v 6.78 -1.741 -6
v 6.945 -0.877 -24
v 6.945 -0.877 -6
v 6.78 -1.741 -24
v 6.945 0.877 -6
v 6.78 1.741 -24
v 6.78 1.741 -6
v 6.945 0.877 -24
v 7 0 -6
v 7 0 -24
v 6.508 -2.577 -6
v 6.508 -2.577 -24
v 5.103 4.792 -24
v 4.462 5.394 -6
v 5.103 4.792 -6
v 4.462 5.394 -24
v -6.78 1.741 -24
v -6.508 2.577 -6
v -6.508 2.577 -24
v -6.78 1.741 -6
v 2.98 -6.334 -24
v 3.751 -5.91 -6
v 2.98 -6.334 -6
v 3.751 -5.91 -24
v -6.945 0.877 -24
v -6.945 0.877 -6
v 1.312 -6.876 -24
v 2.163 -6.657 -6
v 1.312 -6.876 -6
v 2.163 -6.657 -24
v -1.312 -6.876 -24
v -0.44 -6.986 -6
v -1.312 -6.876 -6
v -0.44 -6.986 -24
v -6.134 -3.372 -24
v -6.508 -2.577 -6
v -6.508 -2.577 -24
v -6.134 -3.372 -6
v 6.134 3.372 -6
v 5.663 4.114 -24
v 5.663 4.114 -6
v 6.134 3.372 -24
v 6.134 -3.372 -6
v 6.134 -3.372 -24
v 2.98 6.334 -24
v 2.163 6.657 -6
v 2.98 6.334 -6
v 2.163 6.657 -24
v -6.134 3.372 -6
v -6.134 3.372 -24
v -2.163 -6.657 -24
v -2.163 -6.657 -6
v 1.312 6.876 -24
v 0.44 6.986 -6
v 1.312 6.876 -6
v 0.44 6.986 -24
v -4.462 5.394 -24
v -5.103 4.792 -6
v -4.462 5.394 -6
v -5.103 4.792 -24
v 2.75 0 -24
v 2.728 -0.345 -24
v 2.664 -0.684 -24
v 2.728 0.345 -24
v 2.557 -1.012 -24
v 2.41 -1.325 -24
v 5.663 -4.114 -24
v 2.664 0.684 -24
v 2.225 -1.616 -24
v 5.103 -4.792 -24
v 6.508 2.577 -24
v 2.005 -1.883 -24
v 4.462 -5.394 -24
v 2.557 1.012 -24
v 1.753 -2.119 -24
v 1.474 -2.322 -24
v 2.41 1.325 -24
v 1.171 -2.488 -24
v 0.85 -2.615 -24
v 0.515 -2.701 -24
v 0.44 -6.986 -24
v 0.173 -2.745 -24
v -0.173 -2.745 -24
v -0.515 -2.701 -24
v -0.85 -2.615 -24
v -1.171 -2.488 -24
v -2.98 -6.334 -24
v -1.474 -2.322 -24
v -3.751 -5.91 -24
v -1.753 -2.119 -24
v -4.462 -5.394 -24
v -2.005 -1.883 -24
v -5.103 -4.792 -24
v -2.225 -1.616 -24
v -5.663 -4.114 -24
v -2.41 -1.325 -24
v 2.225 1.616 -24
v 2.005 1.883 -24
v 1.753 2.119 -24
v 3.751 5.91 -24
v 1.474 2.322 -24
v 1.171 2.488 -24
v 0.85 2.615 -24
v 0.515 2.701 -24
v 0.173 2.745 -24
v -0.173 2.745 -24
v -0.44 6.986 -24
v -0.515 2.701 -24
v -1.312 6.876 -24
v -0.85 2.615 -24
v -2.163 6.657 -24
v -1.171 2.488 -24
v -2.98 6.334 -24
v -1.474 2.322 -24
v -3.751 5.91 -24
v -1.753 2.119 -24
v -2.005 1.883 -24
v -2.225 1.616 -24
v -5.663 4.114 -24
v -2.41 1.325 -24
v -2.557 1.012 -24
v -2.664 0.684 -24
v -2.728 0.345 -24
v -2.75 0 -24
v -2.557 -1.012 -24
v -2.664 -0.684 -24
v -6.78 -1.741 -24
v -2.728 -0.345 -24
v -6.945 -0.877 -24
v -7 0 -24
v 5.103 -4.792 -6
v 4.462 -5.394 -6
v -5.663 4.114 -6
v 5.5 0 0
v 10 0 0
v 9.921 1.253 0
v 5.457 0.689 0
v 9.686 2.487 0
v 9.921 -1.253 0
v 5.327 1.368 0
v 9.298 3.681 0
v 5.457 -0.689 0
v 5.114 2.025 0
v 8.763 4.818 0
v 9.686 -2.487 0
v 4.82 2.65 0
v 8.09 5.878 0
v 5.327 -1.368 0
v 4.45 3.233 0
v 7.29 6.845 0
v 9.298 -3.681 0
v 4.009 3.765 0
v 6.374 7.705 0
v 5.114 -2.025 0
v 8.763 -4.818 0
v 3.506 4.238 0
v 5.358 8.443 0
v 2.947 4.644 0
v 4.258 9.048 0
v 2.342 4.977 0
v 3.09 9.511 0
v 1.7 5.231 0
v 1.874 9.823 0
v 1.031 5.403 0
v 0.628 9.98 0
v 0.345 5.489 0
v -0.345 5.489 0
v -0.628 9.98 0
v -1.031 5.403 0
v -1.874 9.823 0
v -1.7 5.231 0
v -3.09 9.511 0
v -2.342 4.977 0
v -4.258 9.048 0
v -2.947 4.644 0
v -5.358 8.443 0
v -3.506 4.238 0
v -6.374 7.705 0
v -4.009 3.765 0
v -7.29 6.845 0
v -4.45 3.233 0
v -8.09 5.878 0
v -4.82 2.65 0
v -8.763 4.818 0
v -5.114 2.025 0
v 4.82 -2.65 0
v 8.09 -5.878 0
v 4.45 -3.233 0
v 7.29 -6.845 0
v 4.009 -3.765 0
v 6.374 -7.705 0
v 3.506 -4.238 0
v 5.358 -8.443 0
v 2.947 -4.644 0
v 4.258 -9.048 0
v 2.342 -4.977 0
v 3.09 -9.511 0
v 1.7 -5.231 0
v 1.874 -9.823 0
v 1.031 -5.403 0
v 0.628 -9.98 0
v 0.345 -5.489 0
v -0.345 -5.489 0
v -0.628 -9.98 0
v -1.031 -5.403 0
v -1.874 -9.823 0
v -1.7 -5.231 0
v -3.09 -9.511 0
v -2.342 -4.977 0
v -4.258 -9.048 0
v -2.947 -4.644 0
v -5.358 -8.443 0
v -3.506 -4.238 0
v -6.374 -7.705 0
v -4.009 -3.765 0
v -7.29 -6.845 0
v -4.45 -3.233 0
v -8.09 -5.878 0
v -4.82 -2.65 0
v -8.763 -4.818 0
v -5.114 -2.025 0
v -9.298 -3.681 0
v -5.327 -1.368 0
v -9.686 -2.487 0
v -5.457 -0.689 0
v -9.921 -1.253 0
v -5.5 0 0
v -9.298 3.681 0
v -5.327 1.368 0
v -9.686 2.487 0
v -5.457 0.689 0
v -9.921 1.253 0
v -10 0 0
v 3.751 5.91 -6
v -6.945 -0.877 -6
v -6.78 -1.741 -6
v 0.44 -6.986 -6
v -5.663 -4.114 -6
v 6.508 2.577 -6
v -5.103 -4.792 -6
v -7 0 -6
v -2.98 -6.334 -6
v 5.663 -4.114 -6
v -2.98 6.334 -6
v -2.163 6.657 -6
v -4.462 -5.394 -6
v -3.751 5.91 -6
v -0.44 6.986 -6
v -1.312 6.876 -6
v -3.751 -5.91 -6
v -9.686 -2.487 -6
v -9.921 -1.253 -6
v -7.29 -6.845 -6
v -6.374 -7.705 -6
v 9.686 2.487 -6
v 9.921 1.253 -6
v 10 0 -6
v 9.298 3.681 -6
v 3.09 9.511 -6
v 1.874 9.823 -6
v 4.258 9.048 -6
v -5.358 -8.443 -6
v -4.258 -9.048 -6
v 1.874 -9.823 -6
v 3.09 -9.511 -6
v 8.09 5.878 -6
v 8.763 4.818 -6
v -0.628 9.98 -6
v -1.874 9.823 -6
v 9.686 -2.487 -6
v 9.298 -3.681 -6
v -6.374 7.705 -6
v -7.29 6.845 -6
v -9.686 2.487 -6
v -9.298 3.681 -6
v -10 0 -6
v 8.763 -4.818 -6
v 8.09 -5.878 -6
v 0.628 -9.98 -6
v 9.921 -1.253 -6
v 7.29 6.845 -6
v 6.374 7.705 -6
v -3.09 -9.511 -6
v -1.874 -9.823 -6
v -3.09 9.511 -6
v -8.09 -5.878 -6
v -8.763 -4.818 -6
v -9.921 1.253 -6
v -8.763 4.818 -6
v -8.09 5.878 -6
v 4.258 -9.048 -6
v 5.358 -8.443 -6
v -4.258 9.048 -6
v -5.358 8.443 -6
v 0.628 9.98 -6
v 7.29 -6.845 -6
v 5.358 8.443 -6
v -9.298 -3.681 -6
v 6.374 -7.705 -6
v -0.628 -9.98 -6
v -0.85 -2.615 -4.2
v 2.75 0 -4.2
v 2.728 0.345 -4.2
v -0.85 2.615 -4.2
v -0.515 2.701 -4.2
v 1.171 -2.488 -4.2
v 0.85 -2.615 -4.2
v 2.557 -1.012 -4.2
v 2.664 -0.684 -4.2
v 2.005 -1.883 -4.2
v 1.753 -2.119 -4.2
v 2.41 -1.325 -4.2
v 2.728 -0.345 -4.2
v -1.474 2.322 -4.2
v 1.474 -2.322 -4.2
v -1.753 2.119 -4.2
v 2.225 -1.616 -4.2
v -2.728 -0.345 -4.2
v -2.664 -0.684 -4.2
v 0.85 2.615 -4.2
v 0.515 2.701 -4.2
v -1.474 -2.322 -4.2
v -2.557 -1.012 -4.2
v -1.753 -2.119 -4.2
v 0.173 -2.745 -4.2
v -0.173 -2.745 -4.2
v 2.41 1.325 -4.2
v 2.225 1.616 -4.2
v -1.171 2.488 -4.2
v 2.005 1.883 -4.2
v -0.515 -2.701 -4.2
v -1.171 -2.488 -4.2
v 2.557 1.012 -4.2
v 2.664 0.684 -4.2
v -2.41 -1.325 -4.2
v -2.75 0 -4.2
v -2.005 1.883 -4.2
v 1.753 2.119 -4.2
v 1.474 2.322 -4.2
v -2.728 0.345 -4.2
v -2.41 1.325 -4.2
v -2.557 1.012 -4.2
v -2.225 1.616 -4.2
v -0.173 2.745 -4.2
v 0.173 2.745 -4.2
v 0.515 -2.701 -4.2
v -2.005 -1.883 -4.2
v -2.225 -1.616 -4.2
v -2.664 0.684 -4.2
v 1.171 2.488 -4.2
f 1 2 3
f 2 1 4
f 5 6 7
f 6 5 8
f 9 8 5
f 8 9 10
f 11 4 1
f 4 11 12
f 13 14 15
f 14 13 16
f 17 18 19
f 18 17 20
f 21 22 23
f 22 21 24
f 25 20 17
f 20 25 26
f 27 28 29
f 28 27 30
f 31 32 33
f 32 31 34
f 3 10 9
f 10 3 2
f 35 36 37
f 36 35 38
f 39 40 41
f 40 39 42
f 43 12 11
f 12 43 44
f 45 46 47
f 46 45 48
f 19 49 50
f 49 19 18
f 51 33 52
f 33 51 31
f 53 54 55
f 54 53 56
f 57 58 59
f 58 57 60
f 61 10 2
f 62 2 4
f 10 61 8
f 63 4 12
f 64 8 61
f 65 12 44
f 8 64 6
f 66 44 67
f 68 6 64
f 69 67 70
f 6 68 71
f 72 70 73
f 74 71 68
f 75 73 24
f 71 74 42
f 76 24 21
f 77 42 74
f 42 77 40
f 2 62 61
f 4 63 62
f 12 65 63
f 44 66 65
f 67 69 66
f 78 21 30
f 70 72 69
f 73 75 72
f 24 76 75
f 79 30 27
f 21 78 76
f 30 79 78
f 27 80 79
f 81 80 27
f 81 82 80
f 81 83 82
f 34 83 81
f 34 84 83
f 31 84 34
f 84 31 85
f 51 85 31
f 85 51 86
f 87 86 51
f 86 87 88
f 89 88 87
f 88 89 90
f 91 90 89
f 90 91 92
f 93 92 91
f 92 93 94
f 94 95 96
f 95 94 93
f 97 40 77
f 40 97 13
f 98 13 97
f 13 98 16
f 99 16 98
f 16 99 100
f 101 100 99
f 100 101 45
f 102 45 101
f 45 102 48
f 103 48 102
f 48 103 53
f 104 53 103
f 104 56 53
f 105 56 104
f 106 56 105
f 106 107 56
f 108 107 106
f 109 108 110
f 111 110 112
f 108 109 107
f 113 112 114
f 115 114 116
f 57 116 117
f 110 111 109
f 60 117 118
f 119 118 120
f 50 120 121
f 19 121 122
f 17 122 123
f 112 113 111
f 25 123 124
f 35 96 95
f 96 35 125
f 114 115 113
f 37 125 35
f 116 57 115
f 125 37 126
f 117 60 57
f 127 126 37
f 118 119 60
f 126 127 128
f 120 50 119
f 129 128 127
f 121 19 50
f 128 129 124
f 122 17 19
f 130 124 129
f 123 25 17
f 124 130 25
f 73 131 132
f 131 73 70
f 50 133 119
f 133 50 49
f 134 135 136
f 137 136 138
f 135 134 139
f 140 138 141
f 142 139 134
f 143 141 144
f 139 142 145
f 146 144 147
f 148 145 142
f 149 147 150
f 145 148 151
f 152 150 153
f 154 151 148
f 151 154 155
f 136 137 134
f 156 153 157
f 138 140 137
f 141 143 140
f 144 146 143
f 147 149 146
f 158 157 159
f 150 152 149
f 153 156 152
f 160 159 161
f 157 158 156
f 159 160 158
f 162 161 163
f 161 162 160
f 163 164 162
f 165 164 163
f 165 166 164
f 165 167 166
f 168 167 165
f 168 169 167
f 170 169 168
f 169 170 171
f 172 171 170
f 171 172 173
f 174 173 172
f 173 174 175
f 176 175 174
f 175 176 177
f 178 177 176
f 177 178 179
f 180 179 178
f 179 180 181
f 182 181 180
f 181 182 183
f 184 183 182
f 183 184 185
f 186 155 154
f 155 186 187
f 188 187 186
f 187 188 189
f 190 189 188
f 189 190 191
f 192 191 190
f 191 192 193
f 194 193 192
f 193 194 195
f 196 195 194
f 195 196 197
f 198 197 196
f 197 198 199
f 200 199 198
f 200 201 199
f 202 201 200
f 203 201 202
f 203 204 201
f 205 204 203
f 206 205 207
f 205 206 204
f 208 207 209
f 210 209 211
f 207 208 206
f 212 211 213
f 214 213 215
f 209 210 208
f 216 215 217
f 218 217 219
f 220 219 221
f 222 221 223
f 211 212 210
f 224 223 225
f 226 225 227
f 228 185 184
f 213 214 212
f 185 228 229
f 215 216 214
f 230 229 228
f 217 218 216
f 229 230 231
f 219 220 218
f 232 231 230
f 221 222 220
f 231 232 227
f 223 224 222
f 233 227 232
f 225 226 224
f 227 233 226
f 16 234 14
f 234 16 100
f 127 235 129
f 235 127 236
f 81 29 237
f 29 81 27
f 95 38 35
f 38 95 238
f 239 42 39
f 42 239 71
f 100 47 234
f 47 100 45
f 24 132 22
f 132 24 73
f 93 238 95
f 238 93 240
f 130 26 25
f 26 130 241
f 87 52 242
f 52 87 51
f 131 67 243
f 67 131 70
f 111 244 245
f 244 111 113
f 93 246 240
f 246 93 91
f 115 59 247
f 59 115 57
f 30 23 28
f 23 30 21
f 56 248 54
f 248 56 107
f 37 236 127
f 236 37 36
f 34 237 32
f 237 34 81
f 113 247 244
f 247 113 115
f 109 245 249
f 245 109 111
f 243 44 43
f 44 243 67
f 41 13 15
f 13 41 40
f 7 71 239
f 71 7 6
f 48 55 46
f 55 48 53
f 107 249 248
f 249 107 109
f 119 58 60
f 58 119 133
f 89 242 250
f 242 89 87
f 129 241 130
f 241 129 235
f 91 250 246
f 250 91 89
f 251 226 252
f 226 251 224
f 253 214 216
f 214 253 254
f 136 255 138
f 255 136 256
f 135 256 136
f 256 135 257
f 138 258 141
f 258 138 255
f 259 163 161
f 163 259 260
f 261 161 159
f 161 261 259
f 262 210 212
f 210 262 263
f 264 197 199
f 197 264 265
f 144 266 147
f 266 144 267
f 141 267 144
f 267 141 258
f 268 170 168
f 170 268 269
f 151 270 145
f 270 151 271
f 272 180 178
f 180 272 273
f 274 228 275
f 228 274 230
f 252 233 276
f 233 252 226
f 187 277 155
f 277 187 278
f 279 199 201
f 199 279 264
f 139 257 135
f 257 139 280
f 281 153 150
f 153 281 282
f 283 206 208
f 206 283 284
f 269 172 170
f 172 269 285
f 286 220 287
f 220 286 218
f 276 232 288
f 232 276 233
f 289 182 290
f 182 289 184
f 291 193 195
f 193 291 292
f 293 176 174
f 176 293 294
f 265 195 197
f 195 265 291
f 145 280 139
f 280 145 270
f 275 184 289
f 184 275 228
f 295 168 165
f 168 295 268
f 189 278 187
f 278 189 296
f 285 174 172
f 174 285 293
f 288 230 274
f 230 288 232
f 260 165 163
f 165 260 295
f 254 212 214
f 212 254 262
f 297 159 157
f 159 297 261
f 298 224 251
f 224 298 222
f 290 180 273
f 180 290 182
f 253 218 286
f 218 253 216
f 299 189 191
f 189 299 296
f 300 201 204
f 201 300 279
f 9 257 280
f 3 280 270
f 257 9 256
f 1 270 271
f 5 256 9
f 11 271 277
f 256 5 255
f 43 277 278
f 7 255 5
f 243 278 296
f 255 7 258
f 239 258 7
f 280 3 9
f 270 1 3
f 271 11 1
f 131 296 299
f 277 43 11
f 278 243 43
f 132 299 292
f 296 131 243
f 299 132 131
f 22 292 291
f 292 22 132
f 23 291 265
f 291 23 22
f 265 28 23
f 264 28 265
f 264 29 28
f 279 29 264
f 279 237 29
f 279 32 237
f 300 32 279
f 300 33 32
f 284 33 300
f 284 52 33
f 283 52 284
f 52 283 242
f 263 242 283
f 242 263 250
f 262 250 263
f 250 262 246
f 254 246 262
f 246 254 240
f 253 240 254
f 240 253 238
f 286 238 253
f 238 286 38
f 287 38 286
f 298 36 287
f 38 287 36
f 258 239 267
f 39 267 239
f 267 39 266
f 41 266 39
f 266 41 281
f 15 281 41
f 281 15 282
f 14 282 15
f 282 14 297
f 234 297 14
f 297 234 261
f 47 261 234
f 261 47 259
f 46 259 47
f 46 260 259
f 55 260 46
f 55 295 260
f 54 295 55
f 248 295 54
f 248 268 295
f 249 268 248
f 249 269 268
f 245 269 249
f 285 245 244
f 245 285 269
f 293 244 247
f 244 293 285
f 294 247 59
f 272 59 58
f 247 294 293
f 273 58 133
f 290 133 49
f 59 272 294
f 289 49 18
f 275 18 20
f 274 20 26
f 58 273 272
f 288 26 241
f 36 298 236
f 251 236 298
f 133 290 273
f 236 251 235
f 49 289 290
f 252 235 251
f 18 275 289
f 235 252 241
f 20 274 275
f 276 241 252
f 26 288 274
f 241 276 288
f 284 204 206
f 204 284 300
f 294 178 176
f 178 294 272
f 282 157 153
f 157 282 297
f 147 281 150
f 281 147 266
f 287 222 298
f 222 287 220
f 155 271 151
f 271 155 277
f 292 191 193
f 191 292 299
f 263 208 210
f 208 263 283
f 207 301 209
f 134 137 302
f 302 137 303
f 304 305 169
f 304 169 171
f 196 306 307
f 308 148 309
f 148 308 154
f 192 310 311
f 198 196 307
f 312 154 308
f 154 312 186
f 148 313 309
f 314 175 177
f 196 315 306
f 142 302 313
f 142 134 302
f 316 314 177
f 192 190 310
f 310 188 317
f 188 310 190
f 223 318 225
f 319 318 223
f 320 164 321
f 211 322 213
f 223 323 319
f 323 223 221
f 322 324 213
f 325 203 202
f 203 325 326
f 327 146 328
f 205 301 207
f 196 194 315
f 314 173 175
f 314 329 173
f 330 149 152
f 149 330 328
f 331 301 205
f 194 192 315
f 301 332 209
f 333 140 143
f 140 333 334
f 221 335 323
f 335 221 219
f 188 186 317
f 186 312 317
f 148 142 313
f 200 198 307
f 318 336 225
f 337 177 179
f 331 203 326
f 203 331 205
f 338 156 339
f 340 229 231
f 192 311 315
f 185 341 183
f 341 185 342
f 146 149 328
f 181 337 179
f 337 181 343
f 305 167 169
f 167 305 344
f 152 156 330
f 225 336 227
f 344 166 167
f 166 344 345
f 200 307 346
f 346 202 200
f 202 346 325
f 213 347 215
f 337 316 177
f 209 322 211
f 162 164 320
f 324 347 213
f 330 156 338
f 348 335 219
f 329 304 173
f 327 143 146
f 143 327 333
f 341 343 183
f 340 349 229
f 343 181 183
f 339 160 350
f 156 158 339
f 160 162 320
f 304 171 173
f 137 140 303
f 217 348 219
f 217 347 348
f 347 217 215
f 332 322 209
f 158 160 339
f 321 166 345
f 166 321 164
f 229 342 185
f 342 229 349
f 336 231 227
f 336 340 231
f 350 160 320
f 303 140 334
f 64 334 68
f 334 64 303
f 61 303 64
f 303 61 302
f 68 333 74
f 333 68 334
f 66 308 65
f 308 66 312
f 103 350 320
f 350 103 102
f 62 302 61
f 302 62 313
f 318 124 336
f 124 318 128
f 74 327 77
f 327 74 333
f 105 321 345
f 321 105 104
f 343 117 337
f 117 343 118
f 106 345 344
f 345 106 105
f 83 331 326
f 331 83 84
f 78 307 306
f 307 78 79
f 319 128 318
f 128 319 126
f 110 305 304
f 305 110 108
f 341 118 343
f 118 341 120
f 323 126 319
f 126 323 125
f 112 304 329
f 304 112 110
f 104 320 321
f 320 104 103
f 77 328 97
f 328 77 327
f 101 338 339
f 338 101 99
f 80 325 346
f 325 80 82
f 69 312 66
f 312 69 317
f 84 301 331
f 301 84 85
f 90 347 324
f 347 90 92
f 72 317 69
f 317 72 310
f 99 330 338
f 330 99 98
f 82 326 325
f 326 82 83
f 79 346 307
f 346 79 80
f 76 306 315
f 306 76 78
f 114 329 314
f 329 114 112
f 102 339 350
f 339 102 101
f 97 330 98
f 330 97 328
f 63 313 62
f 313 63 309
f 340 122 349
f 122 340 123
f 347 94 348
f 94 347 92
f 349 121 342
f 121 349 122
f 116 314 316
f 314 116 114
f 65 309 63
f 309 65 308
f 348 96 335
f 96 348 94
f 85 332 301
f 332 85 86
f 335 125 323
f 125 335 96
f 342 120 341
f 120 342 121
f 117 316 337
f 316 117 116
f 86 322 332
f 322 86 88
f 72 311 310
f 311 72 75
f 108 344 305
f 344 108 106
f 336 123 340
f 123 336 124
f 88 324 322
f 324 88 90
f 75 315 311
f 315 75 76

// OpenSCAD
$fn = 50;


difference() {
	union() {
		translate(v = [0, 0, -24.0000000000]) {
			cylinder(h = 24, r = 7.0000000000);
		}
		translate(v = [0, 0, -6.0000000000]) {
			cylinder(h = 6, r = 10.0000000000);
		}
	}
	union() {
		translate(v = [0, 0, 0]) {
			rotate(a = [0, 0, 0]) {
				difference() {
					union() {
						#translate(v = [0, 0, -24.0000000000]) {
							cylinder(h = 24, r = 2.2500000000);
						}
						#translate(v = [0, 0, -4.2000000000]) {
							cylinder(h = 4.2000000000, r1 = 2.7500000000, r2 = 5.5000000000);
						}
						#translate(v = [0, 0, -24.0000000000]) {
							cylinder(h = 24, r = 2.7500000000);
						}
						#translate(v = [0, 0, -24.0000000000]) {
							cylinder(h = 24, r = 2.2500000000);
						}
					}
					union();
				}
			}
		}
	}
}
